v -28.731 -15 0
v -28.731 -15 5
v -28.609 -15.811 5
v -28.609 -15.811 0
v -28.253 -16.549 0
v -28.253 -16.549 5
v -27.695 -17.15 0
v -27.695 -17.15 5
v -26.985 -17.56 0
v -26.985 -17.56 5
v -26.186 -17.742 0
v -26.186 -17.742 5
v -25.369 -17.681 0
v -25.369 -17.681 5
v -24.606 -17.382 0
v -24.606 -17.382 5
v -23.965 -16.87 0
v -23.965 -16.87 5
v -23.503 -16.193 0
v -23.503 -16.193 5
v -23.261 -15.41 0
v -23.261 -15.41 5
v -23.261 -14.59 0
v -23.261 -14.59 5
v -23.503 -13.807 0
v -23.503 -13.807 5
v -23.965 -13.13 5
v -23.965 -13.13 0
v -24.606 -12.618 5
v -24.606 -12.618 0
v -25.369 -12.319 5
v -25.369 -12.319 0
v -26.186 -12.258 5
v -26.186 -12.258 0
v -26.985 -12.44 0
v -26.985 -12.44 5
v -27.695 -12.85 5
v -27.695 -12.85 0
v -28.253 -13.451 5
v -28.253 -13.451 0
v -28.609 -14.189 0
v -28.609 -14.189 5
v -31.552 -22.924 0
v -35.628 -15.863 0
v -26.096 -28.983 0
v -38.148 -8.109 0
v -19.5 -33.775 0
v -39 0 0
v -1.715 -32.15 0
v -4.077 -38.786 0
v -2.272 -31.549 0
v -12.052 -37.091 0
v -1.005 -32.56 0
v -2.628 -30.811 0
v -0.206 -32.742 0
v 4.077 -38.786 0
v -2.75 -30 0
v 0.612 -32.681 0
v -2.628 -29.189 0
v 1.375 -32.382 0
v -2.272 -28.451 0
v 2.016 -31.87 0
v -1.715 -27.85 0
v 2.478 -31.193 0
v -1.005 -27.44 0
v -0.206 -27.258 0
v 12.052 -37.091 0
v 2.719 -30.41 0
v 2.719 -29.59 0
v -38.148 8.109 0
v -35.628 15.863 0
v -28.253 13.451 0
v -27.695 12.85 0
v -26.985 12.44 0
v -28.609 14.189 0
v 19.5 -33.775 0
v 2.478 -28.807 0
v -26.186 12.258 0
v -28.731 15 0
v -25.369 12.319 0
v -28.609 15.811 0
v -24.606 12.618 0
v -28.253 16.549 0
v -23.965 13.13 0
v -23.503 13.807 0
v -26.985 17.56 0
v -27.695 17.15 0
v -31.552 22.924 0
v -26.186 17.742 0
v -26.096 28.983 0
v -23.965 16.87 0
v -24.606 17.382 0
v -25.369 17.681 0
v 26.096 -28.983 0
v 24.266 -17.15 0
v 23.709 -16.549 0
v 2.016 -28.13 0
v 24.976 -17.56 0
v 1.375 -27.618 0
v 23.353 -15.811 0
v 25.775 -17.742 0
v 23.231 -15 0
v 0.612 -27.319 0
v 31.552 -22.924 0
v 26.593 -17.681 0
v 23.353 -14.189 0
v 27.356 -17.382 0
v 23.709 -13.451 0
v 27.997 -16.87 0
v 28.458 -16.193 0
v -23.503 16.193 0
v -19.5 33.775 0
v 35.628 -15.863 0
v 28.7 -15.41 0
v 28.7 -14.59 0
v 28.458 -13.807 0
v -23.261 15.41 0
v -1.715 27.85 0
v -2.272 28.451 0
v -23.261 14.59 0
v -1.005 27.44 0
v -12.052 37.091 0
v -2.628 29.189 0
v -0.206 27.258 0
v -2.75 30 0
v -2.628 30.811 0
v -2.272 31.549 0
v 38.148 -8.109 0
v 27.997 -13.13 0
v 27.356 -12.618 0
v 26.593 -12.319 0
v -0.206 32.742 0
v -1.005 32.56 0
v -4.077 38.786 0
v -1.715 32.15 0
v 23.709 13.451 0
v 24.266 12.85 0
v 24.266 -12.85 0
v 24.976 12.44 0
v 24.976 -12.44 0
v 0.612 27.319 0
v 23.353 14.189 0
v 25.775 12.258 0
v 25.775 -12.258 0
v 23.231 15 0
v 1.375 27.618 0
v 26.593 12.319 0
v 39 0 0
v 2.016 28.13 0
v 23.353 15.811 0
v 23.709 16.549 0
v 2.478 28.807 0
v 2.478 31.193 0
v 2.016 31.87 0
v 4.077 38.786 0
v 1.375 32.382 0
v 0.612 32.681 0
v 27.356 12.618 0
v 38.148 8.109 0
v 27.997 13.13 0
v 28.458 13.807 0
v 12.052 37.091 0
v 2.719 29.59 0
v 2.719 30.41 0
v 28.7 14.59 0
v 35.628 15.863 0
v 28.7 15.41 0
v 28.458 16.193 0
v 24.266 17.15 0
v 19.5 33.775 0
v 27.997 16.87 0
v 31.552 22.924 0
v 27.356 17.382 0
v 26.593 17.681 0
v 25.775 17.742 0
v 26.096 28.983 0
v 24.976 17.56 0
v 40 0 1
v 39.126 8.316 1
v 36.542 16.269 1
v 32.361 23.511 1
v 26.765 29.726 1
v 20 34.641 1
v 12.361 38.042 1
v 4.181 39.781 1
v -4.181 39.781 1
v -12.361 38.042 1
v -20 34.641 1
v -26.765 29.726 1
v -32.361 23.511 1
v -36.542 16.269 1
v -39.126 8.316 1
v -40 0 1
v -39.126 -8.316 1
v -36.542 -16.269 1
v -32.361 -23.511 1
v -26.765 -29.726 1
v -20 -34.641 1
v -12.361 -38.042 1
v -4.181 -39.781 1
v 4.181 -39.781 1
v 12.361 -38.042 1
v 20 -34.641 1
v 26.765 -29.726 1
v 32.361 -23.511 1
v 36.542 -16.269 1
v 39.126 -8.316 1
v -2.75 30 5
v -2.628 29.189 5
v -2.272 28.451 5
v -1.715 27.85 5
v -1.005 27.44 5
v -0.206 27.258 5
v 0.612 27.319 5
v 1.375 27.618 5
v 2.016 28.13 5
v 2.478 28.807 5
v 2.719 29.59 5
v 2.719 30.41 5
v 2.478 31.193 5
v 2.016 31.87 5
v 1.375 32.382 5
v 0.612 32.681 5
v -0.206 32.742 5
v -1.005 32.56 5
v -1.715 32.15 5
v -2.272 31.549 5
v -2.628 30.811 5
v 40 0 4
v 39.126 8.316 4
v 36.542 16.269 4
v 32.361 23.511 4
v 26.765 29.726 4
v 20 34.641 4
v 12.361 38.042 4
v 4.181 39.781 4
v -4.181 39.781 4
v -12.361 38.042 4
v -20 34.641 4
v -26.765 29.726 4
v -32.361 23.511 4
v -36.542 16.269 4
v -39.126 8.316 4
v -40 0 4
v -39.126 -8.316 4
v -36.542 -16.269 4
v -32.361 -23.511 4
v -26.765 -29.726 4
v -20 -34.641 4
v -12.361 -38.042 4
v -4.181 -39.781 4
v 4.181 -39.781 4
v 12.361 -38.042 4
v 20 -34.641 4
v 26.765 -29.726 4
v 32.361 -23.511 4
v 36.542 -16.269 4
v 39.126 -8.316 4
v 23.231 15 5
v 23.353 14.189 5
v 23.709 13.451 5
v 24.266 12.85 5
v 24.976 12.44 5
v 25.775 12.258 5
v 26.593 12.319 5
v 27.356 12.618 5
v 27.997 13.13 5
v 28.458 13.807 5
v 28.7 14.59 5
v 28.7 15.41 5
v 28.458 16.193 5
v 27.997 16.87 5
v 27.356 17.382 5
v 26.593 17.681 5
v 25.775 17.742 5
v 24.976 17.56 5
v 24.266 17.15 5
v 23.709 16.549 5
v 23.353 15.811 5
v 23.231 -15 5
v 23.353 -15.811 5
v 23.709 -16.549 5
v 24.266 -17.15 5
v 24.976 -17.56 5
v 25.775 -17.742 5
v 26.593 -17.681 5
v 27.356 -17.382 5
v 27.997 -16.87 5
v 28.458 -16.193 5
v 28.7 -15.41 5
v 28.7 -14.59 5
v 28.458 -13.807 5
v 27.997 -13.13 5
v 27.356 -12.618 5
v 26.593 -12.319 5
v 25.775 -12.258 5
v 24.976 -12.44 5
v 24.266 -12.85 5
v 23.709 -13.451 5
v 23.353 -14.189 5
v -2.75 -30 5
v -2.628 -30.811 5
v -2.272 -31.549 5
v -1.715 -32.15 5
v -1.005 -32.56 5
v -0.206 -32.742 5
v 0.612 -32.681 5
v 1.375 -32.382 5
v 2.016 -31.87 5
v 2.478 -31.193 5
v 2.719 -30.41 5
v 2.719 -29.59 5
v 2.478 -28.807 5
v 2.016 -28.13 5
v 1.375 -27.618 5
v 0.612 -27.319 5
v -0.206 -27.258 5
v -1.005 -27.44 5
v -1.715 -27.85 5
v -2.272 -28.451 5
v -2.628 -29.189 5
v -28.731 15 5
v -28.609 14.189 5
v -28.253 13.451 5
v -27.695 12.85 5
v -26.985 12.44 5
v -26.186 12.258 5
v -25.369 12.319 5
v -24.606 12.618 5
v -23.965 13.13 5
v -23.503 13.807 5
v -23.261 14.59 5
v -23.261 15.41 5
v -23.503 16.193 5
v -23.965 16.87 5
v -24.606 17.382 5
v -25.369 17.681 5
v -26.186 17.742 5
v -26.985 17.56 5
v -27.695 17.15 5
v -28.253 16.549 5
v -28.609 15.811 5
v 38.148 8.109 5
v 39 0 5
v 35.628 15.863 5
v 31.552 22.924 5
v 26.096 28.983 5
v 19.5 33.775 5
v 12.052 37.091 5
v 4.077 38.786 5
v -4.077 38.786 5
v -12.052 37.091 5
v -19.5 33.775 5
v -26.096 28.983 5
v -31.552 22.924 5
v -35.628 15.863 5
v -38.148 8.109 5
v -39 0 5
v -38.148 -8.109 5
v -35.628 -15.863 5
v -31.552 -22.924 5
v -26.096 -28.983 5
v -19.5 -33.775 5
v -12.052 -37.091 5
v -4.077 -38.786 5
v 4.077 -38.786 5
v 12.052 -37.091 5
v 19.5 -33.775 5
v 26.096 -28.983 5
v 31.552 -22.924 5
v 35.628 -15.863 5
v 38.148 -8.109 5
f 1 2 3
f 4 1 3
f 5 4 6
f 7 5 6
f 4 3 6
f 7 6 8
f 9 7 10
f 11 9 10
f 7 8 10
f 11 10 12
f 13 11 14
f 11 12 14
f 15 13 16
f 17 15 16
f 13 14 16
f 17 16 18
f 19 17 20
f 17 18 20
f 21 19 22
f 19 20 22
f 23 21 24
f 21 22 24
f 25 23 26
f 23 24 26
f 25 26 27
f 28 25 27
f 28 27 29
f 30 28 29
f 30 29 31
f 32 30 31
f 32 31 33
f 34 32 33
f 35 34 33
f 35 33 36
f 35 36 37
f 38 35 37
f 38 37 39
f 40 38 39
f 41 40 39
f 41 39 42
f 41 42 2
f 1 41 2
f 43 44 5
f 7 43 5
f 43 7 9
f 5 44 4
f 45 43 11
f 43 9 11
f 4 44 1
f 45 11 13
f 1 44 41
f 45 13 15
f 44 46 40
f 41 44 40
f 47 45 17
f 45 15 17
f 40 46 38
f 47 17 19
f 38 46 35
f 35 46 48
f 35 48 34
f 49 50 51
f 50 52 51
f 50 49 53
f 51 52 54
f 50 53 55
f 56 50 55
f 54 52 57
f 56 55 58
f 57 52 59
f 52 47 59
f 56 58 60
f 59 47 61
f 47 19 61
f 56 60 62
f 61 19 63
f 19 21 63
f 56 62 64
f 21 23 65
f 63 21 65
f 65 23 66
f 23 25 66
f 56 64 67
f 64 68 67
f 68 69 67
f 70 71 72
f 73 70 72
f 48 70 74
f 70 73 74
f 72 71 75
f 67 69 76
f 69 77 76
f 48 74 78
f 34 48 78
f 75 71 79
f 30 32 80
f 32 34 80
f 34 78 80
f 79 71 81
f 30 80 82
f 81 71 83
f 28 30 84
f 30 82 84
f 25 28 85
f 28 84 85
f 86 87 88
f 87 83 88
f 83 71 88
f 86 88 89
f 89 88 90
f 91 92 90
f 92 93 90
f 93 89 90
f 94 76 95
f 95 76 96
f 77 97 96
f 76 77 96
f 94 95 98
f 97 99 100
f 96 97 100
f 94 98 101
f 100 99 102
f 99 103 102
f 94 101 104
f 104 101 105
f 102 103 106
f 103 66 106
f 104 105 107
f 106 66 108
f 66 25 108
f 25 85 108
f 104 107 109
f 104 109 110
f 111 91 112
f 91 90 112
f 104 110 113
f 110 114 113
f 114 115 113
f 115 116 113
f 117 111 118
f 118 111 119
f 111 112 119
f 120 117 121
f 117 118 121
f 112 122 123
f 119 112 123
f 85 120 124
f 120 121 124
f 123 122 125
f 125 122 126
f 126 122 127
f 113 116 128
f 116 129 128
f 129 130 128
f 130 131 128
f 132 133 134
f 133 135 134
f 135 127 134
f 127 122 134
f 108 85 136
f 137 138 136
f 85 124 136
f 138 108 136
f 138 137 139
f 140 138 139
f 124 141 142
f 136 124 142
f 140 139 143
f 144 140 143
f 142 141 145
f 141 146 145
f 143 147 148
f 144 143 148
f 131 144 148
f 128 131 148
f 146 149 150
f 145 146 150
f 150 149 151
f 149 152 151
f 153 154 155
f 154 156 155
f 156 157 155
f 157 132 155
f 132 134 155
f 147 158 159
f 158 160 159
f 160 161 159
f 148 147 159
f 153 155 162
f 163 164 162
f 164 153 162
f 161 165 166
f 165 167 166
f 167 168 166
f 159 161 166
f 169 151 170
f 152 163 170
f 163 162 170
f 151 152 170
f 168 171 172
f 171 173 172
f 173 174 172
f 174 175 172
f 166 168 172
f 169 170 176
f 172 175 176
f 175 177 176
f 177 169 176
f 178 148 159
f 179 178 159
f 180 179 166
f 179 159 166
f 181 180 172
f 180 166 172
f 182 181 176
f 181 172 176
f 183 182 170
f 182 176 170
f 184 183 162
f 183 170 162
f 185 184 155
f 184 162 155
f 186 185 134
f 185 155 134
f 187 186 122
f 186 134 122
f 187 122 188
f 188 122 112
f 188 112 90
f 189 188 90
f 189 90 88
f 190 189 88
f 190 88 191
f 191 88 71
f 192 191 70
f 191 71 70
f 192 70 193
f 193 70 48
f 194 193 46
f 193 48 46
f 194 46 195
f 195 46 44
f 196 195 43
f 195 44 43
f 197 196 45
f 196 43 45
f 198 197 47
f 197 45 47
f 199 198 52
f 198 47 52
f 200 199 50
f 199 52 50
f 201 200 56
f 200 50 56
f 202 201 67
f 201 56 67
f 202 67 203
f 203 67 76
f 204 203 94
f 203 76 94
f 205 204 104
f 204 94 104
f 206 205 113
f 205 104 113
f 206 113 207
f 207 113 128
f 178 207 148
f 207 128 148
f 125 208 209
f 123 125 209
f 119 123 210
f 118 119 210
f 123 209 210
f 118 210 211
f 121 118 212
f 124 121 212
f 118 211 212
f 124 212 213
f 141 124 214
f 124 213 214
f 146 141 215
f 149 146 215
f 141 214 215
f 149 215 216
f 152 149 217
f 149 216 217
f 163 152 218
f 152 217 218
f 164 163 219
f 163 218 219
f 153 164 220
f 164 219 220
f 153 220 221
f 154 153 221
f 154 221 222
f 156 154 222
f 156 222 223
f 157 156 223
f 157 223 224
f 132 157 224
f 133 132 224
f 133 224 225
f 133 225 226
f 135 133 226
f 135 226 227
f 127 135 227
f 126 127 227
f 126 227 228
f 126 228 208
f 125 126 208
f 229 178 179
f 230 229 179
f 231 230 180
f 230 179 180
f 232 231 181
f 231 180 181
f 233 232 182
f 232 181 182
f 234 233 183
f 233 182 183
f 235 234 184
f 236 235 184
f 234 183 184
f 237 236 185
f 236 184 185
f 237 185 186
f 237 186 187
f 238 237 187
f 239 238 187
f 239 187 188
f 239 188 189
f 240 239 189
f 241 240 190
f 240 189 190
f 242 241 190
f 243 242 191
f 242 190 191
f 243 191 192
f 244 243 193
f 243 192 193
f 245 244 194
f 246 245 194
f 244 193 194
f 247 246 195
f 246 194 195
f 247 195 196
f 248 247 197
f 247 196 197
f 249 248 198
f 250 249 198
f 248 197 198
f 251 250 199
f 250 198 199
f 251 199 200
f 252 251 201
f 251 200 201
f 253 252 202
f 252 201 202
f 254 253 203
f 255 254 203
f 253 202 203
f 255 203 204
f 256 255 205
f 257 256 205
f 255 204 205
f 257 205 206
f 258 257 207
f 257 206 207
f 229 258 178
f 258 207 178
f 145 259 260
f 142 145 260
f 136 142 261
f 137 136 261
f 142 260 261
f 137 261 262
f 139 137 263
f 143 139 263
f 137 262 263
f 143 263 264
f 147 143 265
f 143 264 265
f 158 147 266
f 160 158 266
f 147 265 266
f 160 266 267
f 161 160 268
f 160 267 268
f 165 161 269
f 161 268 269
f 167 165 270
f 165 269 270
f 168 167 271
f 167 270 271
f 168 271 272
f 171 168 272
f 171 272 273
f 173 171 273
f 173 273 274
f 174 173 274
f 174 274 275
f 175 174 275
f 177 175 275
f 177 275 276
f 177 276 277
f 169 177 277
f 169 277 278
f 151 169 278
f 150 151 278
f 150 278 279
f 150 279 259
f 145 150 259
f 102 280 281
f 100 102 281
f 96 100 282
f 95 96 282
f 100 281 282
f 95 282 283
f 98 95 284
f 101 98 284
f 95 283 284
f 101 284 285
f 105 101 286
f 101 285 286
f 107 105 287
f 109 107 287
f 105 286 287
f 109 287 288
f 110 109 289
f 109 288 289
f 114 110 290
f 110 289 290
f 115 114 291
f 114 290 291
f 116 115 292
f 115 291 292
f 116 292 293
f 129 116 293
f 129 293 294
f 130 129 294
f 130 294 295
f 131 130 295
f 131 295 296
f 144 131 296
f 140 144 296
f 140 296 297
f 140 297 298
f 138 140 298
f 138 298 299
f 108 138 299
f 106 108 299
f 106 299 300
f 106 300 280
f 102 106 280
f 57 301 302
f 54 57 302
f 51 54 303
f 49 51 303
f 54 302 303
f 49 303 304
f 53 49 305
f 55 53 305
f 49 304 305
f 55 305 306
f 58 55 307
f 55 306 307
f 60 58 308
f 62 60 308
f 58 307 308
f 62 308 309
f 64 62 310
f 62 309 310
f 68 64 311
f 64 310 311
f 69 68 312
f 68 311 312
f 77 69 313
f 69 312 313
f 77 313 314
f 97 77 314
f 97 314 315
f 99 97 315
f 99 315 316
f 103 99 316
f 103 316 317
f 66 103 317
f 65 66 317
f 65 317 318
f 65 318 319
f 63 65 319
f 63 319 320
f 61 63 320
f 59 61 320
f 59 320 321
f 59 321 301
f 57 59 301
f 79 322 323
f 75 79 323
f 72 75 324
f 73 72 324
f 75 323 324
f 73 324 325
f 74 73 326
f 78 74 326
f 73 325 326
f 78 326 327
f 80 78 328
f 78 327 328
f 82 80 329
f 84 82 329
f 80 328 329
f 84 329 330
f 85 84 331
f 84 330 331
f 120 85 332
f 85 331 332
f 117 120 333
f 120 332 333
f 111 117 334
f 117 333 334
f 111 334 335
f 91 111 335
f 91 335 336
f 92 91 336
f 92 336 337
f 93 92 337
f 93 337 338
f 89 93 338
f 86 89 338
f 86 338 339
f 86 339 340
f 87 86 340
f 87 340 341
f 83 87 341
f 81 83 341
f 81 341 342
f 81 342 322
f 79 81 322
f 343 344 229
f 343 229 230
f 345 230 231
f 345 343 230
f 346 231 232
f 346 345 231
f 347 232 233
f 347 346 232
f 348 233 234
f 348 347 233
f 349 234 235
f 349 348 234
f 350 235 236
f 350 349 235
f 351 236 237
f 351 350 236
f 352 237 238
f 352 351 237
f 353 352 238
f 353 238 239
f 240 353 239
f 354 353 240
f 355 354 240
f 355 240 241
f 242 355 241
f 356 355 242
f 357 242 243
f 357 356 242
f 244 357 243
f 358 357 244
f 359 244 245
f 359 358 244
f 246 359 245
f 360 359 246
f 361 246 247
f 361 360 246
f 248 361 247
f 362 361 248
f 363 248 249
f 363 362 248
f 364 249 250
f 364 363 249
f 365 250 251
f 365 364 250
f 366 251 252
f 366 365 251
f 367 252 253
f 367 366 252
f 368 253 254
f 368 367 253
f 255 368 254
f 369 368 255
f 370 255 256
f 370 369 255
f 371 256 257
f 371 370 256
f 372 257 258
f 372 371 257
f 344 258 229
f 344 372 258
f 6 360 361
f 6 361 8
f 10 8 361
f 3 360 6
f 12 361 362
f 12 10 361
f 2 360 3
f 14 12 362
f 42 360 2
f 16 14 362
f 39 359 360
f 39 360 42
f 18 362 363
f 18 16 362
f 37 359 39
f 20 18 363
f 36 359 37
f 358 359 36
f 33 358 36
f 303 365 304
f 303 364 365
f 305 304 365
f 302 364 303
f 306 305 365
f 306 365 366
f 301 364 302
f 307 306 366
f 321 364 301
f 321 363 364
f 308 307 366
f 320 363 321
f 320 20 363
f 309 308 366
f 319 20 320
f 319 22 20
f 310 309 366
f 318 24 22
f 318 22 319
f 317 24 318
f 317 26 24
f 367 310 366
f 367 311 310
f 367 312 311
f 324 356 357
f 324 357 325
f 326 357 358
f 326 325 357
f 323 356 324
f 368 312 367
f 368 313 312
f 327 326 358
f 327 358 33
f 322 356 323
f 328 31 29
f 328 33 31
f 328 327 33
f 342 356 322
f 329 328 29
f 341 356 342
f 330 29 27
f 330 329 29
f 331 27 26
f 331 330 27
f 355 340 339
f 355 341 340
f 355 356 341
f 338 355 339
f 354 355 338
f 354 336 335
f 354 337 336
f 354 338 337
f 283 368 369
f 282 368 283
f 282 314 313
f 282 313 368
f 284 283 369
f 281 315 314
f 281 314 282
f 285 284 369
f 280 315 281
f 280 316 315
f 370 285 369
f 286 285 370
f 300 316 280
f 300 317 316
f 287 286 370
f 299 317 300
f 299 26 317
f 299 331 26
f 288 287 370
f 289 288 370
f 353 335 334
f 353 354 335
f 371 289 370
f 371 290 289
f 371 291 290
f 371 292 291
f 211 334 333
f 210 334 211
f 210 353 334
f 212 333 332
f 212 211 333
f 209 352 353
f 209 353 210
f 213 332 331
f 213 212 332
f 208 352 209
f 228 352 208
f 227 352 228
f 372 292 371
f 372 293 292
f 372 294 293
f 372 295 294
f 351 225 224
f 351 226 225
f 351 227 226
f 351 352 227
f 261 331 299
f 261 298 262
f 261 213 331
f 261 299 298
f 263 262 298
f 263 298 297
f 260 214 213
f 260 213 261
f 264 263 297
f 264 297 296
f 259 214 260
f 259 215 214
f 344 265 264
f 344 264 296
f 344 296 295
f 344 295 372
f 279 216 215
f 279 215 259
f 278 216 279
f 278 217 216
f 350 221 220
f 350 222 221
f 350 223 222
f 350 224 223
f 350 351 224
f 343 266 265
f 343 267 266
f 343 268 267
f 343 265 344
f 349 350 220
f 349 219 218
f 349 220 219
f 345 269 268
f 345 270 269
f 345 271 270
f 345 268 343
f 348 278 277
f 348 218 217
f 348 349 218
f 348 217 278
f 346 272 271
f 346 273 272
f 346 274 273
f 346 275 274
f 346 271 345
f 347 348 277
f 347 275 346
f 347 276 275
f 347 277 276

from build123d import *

# Parameters (mm, degrees)
F0_R     = 40
F1_DEPTH = 5
F3_D     = 5.5
F4_SIZE  = 1


with BuildPart() as f1:
    # F0 (on Top) → F1 (new body)
    with BuildSketch(Plane.XY):
        Circle(F0_R)
    extrude(amount=F1_DEPTH)

    # F3 (through all)
    with Locations(Plane(origin=(0, 0, 0), x_dir=(1, 0, 0), z_dir=(0, 0, -1))):
        with Locations((0, 30), (25.980762, -15), (-25.980762, -15), (0, -30), (25.980762, 15), (-25.980762, 15)):
            Hole(F3_D / 2)

    # F4
    f4_edges = [f1.edges().sort_by_distance(p)[0] for p in [
        (-40, 0, 5),
        (-40, 0, 0),
    ]]
    chamfer(f4_edges, length=F4_SIZE)


solid = f1.part
